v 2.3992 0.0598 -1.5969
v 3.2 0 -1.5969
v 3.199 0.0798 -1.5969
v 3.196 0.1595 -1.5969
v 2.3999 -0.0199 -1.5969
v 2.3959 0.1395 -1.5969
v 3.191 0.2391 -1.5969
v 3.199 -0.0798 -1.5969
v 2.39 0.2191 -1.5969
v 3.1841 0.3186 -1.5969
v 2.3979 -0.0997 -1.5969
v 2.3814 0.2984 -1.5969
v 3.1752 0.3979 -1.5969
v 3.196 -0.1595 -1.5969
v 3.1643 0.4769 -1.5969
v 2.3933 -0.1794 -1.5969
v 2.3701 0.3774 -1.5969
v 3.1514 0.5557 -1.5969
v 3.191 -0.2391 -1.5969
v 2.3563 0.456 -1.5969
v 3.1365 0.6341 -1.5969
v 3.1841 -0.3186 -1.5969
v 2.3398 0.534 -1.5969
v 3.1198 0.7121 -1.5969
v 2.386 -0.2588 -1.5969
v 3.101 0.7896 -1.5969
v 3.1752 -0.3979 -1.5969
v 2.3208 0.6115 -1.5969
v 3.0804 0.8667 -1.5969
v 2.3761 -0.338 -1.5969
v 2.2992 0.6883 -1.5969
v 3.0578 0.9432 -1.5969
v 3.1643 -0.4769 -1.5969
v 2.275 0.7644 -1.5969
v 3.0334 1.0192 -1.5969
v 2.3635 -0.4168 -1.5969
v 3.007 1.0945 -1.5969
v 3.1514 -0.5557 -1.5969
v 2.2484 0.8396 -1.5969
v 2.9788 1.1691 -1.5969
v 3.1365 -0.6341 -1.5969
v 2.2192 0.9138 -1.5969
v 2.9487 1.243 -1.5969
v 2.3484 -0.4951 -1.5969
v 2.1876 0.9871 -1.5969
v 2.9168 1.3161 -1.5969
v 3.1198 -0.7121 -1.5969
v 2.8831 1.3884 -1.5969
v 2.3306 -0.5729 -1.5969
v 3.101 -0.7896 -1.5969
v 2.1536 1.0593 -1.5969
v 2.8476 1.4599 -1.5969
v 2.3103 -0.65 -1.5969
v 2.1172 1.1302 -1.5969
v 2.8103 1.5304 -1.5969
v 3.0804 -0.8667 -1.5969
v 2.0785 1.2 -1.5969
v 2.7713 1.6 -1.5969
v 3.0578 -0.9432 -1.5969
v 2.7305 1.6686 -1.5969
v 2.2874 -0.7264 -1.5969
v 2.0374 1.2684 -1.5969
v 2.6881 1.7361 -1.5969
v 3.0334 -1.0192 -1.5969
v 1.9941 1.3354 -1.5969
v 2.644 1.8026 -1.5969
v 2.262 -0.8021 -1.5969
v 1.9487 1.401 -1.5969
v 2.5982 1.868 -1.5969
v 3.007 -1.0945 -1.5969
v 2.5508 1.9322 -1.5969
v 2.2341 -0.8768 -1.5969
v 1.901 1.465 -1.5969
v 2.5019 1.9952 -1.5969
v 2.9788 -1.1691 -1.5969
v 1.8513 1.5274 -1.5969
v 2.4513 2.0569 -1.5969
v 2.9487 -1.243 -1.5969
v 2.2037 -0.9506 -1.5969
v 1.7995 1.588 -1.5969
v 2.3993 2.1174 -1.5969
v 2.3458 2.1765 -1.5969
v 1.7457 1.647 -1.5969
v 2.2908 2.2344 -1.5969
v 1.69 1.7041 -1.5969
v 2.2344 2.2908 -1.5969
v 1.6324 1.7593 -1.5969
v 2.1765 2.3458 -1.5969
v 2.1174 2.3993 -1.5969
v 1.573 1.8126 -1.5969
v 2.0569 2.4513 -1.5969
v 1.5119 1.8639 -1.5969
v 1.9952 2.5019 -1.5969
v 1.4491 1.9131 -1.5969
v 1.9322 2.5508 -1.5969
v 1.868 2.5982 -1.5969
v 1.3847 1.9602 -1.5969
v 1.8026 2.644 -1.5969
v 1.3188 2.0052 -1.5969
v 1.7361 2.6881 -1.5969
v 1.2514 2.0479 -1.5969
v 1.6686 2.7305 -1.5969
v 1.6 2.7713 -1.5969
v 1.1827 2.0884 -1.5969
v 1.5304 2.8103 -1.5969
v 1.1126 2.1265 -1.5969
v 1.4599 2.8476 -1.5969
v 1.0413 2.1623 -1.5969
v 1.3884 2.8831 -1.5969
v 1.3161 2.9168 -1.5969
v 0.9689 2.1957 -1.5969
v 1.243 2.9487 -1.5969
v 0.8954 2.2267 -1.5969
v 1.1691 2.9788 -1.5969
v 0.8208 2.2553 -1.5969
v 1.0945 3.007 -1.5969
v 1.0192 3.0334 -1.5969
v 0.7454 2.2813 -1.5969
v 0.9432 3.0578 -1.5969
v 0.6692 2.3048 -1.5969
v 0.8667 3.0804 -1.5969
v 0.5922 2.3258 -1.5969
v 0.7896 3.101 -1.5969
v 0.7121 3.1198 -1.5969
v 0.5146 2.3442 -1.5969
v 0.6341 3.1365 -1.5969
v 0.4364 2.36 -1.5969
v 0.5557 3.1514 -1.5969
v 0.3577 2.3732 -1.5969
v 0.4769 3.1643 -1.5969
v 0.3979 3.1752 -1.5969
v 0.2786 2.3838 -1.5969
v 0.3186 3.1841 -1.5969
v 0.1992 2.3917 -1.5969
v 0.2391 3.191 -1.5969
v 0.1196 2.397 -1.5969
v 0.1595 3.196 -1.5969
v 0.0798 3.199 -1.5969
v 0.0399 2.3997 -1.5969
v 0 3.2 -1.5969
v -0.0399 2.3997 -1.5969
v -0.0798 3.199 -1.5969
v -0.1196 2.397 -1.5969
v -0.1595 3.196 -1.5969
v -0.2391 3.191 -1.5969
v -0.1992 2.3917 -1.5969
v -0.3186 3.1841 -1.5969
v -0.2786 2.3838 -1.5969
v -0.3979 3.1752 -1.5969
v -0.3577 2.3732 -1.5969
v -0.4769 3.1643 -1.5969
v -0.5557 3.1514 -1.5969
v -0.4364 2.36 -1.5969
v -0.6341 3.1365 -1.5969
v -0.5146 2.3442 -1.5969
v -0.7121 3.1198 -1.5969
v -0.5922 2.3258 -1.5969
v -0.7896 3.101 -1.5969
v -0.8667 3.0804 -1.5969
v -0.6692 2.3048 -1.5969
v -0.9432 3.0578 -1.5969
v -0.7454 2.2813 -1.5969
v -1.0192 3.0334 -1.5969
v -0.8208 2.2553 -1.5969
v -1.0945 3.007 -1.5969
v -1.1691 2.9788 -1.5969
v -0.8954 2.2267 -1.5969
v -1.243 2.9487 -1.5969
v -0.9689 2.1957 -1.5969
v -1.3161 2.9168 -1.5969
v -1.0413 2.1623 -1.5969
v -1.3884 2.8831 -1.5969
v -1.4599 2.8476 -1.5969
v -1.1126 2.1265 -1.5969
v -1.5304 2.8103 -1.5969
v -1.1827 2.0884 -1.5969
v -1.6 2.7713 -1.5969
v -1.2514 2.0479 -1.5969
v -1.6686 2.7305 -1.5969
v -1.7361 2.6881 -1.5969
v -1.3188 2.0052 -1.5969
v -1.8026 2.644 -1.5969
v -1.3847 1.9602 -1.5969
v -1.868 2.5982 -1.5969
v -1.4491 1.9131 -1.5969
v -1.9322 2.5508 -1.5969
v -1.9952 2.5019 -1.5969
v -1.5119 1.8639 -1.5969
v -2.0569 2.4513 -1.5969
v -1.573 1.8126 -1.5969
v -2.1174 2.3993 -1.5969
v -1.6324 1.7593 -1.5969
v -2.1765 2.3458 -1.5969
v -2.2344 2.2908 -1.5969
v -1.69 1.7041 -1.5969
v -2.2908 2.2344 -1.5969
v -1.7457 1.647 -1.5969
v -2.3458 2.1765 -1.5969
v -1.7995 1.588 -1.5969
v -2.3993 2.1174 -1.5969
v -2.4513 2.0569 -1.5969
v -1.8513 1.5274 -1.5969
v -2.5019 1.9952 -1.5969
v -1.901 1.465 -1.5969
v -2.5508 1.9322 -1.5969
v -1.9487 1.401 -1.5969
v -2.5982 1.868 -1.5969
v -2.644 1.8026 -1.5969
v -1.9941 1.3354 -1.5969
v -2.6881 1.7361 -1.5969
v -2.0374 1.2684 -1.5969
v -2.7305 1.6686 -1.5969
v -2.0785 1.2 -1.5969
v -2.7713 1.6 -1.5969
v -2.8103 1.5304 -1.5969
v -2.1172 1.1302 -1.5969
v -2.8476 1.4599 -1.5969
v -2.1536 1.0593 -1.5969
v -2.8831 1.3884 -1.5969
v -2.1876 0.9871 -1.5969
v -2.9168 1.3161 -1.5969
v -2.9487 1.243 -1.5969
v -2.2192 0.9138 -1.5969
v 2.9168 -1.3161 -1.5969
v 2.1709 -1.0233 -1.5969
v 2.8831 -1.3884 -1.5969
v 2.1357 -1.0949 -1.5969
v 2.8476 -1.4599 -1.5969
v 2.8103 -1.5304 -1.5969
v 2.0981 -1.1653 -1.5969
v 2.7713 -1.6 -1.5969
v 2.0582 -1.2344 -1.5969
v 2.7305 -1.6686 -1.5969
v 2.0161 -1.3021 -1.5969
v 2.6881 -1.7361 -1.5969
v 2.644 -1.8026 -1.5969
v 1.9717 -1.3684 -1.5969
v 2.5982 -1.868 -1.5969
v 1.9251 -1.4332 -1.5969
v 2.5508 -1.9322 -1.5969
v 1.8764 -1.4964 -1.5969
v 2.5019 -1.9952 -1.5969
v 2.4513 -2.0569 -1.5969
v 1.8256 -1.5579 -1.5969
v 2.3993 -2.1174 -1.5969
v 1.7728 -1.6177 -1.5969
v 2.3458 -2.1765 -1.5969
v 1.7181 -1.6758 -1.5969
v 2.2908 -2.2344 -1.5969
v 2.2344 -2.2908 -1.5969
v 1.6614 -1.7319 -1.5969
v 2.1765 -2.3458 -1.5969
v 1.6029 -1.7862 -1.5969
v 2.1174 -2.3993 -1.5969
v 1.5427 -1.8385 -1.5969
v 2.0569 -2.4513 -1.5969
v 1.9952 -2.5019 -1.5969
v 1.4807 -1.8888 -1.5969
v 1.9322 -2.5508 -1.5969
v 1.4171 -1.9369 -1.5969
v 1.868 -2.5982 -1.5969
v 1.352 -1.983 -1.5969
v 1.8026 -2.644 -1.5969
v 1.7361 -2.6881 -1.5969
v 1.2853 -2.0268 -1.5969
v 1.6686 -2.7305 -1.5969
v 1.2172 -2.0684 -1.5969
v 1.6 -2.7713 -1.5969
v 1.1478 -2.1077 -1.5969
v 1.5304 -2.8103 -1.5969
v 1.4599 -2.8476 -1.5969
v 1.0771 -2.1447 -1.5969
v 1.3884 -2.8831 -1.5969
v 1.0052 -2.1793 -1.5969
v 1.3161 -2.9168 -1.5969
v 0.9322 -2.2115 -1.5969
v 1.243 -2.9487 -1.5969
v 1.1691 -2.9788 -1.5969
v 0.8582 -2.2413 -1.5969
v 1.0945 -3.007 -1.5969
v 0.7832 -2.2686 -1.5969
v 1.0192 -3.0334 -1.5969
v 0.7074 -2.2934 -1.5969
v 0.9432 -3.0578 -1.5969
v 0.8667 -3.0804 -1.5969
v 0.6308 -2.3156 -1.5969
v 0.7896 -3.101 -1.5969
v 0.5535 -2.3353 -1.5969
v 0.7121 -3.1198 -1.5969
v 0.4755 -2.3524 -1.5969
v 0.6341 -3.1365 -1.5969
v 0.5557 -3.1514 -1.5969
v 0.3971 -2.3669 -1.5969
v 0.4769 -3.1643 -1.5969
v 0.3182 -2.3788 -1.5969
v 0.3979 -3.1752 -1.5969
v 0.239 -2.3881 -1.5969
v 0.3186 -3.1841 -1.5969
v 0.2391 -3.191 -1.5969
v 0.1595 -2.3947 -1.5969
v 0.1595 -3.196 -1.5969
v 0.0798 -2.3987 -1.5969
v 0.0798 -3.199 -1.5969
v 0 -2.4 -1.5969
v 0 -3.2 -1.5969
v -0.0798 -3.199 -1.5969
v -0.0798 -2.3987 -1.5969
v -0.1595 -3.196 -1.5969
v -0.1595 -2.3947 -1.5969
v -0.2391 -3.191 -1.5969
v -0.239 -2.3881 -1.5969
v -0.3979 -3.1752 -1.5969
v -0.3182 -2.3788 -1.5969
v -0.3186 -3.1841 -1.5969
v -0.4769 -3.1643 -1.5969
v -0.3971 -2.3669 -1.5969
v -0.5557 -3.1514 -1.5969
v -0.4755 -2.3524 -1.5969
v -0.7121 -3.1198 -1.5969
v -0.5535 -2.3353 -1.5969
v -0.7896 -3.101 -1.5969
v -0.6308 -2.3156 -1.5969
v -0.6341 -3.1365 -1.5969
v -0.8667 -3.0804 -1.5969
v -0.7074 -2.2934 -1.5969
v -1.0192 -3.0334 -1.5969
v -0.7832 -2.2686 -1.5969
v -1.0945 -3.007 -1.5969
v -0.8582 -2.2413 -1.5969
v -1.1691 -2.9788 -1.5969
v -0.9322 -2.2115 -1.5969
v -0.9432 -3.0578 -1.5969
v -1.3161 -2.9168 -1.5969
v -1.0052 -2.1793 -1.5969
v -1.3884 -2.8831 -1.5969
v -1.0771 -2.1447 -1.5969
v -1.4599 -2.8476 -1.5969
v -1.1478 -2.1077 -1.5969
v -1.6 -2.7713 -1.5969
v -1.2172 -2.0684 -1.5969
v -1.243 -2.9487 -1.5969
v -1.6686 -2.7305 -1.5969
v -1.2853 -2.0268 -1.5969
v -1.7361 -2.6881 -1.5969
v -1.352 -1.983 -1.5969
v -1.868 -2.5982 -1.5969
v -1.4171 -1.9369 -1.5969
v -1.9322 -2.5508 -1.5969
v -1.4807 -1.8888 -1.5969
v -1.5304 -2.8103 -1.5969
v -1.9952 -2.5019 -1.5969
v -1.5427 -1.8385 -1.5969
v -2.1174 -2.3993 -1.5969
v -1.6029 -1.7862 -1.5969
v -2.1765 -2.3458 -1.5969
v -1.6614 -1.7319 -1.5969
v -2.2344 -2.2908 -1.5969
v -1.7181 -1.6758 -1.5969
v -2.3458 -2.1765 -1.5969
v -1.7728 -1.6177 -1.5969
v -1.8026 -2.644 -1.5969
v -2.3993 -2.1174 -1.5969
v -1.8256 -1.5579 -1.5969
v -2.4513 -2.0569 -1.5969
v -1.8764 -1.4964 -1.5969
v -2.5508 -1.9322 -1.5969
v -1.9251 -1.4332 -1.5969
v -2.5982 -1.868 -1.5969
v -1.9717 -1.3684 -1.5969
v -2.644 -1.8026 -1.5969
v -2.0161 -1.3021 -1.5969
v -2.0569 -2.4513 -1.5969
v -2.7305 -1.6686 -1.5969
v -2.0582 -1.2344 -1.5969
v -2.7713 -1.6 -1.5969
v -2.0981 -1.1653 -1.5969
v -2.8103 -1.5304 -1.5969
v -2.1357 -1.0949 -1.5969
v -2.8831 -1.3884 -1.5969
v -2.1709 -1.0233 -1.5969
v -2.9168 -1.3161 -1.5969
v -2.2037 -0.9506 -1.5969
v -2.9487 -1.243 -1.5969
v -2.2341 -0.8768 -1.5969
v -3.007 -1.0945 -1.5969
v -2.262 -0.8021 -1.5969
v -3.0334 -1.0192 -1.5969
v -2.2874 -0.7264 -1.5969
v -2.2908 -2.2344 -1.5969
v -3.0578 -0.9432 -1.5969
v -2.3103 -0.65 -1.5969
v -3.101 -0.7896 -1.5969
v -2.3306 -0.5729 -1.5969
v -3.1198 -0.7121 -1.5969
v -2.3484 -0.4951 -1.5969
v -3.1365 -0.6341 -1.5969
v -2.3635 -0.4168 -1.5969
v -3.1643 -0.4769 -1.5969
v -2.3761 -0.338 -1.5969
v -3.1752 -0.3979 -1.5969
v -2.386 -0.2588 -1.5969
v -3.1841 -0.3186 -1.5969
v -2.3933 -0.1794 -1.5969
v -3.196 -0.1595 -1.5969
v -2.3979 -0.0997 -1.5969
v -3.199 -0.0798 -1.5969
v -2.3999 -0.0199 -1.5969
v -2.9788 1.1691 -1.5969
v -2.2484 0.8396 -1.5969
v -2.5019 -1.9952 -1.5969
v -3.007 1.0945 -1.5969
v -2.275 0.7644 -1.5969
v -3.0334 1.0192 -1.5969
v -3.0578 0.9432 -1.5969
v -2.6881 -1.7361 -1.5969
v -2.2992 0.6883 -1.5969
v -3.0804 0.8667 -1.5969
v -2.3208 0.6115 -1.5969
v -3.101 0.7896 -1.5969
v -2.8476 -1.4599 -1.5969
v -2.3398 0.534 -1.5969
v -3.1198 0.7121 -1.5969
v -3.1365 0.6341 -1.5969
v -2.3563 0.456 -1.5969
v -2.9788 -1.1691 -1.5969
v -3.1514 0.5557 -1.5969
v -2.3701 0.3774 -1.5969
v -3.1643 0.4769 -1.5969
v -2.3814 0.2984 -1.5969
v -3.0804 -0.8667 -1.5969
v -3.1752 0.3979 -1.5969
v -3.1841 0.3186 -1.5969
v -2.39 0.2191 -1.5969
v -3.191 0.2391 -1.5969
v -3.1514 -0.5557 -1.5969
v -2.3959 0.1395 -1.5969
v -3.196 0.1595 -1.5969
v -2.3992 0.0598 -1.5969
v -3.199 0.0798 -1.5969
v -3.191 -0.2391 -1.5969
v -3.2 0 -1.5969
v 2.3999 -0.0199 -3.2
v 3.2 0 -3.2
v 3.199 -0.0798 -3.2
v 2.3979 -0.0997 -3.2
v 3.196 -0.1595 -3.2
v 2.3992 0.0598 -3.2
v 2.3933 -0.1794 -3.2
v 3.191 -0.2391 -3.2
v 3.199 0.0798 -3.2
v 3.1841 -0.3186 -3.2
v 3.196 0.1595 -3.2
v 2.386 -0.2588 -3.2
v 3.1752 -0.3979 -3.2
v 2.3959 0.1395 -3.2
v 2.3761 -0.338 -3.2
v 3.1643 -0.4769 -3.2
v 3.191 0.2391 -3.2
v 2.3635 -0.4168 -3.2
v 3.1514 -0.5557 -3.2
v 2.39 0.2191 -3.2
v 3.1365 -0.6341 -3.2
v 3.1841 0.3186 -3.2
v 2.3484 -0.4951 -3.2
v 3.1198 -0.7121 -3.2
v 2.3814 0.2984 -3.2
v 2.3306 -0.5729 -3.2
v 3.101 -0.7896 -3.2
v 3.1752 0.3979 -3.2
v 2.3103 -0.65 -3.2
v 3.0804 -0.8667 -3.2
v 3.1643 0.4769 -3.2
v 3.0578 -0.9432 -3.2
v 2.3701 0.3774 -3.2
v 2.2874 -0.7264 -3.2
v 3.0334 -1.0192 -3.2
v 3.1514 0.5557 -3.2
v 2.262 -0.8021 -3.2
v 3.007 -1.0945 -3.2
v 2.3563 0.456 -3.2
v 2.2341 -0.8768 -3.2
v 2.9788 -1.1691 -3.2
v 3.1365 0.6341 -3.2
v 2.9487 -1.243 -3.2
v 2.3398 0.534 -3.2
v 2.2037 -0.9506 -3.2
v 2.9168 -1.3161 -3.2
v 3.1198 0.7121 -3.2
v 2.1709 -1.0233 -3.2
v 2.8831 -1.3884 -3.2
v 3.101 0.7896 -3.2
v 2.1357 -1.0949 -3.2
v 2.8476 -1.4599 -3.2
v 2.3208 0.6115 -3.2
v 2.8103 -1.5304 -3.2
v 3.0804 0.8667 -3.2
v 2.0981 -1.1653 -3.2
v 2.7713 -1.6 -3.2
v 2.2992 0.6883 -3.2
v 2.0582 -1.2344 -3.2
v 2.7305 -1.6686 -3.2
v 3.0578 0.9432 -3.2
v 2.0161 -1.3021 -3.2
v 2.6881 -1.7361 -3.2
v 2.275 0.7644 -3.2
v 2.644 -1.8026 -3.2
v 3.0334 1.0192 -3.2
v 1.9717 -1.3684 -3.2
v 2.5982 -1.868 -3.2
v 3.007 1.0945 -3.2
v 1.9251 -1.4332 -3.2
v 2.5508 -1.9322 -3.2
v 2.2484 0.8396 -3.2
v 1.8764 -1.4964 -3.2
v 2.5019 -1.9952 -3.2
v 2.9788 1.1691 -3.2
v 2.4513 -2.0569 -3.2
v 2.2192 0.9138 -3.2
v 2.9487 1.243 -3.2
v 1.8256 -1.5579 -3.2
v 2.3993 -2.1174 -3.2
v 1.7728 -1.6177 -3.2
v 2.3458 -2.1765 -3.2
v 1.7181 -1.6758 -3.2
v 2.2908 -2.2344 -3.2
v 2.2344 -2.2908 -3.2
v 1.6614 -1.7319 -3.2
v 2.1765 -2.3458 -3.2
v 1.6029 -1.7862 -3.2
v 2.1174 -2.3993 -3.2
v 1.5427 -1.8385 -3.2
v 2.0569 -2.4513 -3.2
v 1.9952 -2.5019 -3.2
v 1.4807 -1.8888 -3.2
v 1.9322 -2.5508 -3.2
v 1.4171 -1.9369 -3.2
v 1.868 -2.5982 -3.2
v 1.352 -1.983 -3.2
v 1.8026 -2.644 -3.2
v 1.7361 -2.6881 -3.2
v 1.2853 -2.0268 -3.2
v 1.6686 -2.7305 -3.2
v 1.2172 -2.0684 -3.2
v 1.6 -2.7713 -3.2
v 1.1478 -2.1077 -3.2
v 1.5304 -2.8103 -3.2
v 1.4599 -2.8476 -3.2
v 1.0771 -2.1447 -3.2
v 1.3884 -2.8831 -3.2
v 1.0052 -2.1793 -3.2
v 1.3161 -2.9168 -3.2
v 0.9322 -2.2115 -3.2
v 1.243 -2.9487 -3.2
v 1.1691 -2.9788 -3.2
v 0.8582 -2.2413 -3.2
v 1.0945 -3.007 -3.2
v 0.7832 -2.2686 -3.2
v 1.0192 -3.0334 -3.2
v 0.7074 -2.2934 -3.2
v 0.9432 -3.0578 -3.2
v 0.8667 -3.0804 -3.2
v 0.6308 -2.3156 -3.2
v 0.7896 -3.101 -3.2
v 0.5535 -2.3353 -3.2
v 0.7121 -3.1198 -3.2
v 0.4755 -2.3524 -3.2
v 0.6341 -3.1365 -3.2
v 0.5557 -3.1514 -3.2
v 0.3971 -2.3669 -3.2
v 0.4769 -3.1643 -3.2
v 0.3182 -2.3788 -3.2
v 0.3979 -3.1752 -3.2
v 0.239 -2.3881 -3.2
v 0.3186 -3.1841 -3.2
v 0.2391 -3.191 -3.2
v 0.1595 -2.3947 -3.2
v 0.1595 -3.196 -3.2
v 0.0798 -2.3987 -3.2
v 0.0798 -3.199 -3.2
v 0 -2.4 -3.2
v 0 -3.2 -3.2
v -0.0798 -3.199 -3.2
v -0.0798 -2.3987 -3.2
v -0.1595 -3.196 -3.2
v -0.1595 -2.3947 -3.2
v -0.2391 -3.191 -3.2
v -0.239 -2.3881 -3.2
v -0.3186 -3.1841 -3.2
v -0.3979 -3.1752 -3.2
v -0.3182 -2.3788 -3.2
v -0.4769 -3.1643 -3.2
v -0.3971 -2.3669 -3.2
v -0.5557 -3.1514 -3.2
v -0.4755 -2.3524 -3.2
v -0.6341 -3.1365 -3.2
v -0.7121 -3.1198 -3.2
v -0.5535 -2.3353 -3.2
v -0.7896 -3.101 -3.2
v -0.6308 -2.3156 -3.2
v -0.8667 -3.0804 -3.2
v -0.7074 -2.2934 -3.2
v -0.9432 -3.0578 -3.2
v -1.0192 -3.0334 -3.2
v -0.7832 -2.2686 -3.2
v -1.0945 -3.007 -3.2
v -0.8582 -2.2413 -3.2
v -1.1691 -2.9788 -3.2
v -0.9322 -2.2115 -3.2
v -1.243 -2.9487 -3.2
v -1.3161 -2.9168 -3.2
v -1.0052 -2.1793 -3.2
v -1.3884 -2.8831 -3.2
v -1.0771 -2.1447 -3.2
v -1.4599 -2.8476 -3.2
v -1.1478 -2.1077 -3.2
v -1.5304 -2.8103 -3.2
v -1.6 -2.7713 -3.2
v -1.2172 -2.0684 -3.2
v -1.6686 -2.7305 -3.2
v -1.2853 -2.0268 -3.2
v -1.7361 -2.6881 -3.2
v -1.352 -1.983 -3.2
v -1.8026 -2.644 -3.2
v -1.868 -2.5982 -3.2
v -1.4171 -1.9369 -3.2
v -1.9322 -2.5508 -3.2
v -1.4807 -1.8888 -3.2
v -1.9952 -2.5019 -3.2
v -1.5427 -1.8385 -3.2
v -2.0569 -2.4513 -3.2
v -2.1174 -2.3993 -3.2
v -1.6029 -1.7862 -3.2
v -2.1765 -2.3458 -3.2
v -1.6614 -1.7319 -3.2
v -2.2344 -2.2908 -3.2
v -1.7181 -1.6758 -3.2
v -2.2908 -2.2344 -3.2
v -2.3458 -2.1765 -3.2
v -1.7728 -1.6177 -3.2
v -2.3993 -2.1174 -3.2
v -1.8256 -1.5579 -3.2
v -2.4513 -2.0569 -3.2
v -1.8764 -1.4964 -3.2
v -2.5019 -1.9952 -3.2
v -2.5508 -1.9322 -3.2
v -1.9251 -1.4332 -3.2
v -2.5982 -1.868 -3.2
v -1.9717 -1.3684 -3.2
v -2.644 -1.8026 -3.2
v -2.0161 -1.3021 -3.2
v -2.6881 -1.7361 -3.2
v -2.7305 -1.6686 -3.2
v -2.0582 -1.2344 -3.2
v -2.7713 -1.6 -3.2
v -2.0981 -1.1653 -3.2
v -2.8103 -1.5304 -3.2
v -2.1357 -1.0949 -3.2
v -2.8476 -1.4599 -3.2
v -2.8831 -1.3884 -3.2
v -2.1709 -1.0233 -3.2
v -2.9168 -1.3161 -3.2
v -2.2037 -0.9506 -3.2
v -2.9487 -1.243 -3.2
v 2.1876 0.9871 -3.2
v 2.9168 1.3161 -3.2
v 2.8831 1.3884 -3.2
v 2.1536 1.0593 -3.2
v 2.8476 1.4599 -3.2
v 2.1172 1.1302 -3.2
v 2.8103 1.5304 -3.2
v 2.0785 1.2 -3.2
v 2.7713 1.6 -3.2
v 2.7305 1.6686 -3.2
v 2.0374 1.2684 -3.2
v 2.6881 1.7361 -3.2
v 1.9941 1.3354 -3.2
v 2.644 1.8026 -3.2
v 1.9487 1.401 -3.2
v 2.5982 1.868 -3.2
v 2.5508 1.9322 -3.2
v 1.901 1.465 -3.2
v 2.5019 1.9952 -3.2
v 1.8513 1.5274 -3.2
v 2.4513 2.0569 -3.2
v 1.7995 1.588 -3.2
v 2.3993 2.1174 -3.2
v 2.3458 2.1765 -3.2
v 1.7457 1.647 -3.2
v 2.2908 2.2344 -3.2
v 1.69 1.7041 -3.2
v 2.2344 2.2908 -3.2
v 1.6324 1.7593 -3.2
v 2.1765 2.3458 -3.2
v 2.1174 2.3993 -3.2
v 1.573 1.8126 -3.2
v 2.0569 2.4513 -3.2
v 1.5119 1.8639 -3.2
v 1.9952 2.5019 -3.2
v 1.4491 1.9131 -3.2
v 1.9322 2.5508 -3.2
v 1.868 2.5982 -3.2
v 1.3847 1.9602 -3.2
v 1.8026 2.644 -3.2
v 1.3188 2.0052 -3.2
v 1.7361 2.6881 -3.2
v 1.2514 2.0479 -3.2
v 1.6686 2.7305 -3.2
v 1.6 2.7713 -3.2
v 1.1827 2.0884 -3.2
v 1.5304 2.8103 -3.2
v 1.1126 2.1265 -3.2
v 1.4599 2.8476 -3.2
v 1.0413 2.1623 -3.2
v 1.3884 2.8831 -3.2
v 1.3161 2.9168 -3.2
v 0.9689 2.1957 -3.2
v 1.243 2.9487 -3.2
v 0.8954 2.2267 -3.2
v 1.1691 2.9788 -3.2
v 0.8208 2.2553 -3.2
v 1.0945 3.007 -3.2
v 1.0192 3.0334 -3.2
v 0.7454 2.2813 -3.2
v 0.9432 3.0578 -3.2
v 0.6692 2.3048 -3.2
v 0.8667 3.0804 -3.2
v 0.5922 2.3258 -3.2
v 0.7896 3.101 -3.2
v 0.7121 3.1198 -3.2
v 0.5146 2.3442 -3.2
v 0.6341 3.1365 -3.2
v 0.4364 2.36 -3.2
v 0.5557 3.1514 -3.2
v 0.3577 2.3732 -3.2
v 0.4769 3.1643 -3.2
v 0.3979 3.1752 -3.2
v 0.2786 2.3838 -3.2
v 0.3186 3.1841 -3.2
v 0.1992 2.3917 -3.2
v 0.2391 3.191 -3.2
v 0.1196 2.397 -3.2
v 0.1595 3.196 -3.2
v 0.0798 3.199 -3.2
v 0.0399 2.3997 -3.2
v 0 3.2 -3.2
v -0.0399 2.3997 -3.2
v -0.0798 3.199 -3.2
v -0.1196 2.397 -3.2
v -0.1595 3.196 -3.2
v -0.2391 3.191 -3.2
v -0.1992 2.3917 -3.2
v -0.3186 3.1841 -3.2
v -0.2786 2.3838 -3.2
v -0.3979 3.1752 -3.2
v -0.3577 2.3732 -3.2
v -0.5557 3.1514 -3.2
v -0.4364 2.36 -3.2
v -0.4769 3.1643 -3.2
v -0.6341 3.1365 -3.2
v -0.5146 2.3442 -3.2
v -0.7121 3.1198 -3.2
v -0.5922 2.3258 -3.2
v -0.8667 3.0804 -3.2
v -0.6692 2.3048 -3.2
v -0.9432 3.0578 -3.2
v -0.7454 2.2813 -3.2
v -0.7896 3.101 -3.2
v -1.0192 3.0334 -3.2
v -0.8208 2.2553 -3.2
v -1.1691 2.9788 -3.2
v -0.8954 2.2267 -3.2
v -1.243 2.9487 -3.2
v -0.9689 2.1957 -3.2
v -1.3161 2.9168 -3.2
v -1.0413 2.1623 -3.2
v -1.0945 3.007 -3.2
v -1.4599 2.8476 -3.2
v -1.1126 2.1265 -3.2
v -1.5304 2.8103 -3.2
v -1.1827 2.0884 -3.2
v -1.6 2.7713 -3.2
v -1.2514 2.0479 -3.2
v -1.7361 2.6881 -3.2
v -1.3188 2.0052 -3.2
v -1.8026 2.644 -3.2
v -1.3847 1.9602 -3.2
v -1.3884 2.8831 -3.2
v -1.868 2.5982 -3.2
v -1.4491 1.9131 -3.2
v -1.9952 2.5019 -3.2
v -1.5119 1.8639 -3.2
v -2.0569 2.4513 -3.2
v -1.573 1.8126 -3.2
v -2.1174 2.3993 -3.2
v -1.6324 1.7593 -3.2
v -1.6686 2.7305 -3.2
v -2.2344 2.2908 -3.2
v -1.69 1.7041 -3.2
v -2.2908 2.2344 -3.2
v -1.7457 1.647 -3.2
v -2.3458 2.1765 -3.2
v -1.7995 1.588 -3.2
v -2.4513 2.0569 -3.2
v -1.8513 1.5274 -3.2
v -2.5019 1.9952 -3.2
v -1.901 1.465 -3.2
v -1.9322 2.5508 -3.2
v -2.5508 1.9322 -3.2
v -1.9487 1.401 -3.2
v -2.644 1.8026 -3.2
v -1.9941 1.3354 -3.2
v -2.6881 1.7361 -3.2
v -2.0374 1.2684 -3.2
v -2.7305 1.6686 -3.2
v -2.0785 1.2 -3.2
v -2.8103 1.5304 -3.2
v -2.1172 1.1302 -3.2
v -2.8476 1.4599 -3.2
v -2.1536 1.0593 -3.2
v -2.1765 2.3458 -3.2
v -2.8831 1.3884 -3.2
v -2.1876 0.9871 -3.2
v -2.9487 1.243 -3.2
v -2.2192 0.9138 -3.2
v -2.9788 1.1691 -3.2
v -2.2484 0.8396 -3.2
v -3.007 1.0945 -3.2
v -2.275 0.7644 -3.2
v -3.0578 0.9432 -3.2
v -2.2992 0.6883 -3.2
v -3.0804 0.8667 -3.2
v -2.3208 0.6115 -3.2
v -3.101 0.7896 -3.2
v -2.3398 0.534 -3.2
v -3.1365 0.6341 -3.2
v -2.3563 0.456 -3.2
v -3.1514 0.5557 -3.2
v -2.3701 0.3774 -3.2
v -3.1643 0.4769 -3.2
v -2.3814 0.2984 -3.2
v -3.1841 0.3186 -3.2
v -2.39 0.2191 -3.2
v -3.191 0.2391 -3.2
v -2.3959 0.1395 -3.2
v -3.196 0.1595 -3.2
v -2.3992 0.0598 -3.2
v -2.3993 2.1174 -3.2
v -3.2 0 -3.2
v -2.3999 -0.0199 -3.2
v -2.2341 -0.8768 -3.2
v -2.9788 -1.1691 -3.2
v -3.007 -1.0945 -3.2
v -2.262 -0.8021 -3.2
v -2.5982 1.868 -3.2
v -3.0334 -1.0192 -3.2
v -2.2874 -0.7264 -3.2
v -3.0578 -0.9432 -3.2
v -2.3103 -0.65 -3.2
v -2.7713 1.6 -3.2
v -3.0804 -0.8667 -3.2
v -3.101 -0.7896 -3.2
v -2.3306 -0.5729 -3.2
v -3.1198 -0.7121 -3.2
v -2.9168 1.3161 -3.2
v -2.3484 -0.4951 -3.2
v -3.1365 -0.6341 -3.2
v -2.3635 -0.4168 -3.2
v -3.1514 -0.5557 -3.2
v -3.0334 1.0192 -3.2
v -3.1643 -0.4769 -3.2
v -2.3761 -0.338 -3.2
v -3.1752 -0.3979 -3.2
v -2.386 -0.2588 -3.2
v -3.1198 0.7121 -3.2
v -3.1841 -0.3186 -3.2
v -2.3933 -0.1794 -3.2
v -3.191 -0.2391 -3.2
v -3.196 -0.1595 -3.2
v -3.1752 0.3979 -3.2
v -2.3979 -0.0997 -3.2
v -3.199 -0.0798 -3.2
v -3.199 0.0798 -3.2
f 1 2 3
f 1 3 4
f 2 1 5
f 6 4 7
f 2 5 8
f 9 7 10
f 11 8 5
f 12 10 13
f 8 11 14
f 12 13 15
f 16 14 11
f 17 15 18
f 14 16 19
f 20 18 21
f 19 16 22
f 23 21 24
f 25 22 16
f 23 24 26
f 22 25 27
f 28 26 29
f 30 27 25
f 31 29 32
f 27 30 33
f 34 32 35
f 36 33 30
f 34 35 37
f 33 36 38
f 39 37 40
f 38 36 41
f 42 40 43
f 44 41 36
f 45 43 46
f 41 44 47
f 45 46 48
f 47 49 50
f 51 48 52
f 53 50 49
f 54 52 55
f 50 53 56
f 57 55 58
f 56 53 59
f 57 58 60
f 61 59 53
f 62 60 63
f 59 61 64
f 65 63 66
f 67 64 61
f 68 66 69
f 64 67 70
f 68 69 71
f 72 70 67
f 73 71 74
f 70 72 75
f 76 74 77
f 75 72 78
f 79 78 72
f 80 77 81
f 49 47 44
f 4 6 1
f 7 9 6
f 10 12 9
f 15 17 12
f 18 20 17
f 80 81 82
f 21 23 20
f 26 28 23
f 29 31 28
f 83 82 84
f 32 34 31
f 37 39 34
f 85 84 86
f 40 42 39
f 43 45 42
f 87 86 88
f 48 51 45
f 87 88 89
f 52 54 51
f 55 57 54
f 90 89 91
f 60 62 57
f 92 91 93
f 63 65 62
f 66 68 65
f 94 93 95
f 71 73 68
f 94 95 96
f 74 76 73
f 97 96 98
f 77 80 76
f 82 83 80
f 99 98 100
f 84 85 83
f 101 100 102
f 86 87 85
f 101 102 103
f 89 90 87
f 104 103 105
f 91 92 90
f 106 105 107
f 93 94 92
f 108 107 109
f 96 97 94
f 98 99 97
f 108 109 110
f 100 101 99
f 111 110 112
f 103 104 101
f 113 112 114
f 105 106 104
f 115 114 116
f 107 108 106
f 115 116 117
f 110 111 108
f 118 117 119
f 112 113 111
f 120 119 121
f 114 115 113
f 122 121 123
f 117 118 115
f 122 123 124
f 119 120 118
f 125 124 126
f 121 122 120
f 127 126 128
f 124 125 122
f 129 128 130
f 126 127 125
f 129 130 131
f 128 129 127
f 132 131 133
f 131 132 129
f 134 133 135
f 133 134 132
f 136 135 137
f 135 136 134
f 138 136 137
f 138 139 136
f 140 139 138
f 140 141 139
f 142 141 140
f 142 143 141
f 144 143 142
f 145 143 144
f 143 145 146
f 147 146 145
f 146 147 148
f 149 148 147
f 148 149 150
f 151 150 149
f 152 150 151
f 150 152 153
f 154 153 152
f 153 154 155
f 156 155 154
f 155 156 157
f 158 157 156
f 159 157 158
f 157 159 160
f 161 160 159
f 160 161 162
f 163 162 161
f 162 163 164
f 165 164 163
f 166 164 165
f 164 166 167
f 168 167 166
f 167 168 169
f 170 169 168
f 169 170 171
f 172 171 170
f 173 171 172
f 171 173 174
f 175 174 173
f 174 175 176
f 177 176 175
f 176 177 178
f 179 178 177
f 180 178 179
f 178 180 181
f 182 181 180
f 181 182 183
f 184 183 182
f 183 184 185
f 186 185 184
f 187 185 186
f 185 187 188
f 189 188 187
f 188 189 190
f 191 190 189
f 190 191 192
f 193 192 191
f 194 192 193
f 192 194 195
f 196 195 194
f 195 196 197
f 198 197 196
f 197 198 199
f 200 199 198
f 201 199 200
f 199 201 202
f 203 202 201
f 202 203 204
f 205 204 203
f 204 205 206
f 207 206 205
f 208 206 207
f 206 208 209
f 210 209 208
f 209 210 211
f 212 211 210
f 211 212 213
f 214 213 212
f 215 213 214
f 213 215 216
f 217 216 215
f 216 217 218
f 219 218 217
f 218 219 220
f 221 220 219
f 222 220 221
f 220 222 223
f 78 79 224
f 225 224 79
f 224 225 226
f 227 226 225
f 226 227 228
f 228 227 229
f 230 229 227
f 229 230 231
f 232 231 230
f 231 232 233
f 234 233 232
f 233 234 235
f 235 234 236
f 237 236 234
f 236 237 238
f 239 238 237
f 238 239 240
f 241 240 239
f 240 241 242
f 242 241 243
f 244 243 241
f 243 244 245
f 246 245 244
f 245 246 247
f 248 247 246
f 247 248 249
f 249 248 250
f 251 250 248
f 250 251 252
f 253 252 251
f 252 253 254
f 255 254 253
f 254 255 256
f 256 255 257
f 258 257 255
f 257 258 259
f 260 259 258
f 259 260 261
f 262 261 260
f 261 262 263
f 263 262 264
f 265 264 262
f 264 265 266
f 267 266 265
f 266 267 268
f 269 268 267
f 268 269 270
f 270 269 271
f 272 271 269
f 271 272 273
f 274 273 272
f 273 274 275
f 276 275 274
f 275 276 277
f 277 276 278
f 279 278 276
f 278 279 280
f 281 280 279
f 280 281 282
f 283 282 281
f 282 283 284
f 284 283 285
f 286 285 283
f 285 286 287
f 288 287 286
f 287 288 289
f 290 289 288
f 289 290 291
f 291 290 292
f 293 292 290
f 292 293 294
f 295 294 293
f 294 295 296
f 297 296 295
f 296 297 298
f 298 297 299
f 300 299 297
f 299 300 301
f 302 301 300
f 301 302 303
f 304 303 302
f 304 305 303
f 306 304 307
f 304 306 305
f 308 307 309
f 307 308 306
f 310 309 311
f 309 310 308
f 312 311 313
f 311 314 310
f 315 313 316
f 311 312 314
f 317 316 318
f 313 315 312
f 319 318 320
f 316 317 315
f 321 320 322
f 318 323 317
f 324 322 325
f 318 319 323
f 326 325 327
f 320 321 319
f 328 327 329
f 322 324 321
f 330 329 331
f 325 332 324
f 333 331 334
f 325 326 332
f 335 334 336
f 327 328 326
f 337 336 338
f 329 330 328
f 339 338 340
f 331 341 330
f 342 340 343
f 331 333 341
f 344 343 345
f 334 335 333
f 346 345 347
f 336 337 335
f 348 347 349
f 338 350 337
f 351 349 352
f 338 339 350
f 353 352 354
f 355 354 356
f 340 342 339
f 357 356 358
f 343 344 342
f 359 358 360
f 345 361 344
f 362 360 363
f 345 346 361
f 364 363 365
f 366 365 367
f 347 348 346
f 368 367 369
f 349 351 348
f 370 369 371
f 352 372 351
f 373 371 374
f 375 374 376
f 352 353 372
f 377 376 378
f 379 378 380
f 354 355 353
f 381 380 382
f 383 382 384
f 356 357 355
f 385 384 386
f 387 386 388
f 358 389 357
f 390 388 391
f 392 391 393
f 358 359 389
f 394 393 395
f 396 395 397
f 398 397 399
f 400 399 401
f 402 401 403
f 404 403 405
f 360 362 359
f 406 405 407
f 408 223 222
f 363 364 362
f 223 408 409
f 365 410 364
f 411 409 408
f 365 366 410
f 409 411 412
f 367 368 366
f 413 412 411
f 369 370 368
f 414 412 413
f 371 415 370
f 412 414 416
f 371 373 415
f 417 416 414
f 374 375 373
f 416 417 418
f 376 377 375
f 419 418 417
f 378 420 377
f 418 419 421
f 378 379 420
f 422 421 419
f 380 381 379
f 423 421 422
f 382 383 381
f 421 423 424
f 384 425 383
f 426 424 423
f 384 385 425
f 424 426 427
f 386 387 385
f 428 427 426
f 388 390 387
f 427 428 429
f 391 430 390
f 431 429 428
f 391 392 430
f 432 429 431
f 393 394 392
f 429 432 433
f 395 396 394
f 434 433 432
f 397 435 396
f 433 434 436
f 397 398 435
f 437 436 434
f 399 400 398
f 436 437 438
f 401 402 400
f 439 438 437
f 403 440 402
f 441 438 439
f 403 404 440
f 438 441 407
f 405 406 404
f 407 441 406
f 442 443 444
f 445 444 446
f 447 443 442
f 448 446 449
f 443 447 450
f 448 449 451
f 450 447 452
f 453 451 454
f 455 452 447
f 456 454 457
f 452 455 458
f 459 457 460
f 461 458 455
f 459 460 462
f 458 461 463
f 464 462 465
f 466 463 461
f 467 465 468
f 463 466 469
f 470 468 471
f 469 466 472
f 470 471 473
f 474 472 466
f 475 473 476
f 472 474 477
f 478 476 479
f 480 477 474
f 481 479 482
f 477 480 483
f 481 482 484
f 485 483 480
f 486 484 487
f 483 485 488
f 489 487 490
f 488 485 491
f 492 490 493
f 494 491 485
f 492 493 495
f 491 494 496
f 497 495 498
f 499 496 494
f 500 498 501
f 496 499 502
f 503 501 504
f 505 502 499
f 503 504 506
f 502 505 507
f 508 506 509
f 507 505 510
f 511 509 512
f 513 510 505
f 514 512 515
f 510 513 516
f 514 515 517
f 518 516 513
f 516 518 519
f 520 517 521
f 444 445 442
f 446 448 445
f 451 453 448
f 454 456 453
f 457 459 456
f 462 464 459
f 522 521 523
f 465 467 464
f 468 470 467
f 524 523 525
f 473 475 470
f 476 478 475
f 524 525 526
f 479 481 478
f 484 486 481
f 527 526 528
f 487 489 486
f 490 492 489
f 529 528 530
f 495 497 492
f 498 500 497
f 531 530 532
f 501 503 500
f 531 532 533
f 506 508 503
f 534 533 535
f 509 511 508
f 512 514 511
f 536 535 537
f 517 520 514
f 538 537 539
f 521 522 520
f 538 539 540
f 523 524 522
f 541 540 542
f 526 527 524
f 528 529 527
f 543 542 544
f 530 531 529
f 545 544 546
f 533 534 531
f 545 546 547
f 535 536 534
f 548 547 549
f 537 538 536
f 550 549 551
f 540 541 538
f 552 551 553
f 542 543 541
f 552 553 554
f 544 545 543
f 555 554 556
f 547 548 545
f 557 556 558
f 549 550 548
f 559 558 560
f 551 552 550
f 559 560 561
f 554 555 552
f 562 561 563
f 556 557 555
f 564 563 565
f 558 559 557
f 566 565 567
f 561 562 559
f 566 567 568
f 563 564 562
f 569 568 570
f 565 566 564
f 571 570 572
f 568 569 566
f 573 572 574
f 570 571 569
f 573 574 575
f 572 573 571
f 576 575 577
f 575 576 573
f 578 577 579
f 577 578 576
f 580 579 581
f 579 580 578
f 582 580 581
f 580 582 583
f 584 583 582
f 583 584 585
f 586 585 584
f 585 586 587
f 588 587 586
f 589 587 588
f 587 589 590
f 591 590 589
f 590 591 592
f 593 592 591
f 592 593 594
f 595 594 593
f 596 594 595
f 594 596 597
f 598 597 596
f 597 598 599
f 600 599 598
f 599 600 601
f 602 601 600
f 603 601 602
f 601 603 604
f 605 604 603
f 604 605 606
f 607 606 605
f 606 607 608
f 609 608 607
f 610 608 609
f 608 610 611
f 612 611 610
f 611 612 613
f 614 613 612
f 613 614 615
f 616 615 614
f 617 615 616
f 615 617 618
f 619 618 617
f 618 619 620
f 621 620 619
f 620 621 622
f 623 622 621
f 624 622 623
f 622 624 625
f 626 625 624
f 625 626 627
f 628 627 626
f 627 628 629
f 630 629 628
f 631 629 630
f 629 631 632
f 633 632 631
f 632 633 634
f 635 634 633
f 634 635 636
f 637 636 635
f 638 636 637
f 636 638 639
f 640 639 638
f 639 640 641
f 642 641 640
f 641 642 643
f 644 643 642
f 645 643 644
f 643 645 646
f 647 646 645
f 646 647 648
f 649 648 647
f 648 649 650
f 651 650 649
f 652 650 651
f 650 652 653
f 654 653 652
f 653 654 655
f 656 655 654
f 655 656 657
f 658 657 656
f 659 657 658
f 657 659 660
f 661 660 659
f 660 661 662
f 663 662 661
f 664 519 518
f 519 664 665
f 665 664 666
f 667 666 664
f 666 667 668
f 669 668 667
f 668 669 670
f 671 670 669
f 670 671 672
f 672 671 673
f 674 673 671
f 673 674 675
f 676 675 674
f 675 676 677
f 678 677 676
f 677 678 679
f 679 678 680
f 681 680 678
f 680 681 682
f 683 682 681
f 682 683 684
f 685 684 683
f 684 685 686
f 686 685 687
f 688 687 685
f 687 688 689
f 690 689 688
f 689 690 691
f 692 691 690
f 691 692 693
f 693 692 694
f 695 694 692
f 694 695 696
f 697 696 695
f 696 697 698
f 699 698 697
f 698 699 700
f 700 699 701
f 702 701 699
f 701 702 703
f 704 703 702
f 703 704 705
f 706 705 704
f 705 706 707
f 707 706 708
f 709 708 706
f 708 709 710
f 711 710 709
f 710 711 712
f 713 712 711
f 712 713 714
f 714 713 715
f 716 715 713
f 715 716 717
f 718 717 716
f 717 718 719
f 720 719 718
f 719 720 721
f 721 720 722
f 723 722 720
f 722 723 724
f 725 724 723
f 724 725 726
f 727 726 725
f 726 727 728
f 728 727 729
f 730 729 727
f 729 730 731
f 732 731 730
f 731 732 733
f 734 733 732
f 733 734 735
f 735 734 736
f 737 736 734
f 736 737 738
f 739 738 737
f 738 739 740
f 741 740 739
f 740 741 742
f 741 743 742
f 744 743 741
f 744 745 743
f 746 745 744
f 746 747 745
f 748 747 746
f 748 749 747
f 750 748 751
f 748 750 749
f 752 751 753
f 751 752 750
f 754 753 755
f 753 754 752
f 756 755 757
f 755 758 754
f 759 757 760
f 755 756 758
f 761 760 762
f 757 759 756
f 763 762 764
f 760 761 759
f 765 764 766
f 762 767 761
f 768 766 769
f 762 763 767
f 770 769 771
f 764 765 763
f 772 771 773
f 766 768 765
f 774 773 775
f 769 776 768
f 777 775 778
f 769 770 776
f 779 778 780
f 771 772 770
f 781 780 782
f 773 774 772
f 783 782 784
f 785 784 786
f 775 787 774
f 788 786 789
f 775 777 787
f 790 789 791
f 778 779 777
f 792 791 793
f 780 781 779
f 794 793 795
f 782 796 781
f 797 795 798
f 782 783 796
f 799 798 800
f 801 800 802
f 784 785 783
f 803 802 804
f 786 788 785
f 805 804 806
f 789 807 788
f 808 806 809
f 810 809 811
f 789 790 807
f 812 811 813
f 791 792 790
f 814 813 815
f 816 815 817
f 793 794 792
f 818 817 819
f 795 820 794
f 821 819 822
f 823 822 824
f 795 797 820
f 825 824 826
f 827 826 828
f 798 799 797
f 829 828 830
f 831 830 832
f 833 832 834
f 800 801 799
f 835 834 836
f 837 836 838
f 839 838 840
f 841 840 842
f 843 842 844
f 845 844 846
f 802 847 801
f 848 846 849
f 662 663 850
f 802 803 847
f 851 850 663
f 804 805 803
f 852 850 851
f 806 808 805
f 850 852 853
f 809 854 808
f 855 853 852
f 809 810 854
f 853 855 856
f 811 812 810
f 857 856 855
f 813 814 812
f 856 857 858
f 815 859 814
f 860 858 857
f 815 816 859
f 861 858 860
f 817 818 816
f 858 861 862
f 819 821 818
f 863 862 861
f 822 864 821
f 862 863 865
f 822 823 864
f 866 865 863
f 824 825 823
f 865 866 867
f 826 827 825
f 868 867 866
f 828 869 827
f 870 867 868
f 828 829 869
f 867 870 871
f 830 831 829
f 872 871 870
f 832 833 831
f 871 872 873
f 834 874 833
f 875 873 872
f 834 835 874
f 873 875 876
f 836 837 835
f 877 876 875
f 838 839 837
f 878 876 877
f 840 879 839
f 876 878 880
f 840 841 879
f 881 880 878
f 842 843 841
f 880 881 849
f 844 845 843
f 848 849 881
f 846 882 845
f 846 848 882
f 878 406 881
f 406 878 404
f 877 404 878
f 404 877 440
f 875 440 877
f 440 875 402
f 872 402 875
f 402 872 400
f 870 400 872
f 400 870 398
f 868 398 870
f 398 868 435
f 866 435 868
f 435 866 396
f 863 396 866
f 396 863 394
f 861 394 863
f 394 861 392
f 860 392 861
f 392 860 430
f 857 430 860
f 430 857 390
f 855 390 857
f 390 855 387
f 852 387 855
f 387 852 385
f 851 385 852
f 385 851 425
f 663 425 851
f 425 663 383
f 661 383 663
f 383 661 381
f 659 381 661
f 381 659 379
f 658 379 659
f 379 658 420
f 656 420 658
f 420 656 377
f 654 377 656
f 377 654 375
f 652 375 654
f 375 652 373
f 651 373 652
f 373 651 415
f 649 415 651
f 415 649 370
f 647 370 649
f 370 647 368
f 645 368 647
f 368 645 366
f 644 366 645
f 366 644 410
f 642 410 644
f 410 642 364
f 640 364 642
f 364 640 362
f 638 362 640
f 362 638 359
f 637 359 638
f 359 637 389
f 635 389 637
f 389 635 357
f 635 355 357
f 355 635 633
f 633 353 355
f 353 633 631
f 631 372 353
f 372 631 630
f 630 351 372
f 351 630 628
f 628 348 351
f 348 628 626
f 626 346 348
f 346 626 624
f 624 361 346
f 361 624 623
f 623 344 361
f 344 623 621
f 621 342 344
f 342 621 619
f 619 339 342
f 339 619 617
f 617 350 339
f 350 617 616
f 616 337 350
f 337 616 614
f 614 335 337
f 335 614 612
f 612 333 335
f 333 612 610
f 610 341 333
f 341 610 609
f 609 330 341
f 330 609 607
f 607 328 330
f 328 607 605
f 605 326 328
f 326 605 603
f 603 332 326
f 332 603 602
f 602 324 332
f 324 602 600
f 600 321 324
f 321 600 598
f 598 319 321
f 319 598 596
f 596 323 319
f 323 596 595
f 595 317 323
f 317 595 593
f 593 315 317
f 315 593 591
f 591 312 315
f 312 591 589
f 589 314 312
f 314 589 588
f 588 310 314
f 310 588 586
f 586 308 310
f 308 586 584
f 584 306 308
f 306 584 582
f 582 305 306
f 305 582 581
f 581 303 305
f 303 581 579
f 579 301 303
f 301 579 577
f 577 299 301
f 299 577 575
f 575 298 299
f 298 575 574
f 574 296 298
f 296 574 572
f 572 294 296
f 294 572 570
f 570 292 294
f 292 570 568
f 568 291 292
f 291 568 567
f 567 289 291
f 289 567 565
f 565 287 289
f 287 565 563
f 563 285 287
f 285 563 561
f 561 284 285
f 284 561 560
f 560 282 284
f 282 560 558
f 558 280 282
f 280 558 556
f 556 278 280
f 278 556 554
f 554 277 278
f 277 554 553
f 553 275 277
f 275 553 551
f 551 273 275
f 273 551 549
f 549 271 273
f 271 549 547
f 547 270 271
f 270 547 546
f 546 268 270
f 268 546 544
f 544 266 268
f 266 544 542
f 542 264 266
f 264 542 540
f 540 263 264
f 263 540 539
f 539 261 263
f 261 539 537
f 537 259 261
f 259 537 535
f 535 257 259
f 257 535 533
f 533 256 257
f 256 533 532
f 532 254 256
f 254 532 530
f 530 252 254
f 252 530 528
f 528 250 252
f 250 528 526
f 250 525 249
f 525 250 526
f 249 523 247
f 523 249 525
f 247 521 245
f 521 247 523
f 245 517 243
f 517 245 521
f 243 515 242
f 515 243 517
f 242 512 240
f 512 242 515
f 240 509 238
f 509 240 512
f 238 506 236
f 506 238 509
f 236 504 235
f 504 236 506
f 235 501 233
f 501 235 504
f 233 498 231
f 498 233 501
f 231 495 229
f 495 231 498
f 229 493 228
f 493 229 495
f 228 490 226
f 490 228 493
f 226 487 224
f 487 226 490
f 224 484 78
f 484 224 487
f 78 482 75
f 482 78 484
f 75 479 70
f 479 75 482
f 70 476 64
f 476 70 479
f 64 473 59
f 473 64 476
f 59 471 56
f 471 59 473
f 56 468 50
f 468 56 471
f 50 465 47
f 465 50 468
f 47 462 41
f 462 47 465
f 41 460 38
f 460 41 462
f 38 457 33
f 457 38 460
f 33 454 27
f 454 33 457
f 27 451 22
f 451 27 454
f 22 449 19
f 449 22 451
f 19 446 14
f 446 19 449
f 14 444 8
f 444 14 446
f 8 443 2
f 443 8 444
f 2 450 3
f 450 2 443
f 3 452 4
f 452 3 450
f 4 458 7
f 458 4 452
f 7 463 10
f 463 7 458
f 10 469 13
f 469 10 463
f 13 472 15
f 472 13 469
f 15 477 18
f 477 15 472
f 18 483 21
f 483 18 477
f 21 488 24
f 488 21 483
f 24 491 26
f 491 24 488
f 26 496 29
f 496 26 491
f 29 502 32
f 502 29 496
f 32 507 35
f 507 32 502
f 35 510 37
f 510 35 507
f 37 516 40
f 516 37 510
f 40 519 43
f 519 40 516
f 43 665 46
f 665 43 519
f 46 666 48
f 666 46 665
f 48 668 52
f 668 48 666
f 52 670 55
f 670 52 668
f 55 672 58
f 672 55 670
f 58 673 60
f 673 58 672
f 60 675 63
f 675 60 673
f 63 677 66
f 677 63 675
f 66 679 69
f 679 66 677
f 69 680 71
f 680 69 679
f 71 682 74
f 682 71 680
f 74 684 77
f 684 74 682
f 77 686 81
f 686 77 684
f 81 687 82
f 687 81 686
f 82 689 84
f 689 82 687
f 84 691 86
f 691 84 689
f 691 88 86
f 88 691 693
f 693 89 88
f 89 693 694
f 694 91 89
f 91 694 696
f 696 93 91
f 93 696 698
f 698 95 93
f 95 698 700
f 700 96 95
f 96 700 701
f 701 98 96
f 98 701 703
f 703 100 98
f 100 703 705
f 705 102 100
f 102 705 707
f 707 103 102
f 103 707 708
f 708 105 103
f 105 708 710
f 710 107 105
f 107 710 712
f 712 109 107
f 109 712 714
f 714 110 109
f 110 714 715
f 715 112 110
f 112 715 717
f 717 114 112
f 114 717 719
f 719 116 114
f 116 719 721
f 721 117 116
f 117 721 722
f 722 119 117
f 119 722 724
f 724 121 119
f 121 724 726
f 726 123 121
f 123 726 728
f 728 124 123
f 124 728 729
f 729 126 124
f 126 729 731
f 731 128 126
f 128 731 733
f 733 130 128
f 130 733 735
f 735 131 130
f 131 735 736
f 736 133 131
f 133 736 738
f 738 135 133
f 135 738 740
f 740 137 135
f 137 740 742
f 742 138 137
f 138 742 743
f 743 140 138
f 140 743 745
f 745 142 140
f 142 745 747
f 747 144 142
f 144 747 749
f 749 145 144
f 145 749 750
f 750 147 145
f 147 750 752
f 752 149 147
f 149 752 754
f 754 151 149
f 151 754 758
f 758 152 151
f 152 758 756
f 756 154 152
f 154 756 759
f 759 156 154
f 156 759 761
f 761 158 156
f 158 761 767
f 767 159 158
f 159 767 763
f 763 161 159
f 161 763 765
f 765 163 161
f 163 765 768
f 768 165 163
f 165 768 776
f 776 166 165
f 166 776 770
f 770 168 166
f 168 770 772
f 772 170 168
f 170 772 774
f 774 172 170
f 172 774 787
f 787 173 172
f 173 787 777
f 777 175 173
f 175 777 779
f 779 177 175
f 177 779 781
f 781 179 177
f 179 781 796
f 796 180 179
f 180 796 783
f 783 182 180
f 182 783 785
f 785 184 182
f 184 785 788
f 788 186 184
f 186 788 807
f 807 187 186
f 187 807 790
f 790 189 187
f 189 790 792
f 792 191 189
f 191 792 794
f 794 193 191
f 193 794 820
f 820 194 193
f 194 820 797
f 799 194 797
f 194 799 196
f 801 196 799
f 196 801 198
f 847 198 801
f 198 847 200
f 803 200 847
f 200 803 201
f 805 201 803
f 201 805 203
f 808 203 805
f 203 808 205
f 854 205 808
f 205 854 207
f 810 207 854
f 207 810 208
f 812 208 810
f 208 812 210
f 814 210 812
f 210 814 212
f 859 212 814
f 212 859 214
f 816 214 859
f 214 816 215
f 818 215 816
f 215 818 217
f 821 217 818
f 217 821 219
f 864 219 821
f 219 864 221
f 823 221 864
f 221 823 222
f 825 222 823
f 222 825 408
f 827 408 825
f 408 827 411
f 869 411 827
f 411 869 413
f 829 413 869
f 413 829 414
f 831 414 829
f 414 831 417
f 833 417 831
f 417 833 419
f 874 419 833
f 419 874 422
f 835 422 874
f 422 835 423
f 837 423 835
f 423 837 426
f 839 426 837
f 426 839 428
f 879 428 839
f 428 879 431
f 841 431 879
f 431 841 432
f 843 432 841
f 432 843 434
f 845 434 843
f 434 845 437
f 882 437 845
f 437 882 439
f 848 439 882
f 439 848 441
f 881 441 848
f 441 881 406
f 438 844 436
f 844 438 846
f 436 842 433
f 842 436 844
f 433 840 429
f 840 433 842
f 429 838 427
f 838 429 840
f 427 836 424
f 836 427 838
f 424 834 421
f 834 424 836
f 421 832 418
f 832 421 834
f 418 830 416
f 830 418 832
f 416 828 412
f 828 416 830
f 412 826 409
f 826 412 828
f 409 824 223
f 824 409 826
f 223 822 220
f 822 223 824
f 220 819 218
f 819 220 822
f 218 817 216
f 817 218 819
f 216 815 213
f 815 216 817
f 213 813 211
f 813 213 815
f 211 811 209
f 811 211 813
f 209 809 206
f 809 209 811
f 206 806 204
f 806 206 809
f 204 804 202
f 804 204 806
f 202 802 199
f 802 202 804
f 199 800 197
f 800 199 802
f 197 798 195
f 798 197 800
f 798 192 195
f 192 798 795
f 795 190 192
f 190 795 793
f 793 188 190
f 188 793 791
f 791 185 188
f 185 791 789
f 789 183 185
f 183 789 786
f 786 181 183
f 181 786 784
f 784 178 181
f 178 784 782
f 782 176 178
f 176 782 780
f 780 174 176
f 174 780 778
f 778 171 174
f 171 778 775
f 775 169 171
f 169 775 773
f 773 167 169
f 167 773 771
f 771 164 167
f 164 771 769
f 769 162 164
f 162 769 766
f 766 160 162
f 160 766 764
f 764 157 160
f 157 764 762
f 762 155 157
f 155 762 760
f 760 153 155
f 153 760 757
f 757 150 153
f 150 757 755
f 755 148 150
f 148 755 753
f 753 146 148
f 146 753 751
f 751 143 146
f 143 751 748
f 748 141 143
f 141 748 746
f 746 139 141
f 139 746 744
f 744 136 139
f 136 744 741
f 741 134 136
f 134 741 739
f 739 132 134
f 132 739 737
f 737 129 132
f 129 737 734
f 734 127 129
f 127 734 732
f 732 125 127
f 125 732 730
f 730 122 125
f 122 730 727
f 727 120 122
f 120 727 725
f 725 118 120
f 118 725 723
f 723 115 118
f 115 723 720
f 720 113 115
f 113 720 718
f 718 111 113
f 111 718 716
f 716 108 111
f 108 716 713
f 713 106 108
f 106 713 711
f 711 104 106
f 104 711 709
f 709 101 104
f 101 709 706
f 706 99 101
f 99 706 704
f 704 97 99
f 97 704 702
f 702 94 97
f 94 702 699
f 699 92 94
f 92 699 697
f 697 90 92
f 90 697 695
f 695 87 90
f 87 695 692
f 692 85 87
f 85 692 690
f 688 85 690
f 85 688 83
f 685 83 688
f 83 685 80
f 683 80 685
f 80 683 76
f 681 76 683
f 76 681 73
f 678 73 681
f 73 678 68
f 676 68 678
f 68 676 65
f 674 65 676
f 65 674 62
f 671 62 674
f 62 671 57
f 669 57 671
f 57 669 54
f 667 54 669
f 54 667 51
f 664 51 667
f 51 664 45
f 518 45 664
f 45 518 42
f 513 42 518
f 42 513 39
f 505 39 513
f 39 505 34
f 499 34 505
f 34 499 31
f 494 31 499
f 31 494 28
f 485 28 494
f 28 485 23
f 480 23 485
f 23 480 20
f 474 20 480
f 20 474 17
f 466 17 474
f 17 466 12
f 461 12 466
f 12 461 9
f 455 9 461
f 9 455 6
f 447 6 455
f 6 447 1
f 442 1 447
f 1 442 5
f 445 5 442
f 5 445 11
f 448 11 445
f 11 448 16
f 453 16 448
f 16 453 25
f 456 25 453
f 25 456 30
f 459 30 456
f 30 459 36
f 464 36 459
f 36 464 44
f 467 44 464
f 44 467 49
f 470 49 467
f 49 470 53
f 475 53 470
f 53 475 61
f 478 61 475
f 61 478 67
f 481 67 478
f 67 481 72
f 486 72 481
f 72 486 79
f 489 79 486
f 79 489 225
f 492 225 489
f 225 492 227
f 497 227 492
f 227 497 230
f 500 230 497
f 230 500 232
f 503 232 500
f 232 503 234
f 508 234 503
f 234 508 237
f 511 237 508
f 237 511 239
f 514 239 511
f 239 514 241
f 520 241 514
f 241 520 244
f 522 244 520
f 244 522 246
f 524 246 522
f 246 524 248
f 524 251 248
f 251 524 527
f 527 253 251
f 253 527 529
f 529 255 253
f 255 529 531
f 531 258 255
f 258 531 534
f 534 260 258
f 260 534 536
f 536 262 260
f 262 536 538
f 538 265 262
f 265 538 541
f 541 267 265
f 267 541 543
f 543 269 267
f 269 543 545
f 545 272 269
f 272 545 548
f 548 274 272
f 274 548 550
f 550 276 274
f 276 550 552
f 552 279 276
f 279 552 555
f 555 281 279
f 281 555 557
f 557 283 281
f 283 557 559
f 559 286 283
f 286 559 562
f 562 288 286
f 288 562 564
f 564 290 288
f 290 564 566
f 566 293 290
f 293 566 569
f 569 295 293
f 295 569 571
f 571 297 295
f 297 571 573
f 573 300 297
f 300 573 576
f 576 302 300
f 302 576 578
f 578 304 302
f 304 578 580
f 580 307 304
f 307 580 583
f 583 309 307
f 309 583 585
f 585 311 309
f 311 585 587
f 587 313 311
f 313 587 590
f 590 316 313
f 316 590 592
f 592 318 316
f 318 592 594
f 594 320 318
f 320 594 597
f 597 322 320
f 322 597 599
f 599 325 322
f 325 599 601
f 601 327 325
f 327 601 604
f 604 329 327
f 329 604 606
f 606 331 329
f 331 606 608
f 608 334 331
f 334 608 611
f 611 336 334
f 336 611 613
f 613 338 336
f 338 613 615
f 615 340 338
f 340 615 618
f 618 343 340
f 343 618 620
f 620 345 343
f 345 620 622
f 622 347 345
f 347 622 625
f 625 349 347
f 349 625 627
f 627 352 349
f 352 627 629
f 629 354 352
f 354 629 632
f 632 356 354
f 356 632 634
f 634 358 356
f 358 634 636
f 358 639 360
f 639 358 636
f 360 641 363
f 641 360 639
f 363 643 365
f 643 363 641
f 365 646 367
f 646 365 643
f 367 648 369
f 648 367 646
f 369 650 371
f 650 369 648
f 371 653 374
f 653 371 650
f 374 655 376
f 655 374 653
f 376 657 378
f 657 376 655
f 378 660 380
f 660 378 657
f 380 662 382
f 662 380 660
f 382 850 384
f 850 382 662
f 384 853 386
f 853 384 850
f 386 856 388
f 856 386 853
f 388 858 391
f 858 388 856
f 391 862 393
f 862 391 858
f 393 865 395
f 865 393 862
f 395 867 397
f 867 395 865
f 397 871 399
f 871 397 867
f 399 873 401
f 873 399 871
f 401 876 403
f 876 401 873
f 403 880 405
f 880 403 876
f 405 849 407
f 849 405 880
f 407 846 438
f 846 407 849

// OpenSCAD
use <../lib.scad>
use <s/3068bs01.scad>
use <s/3068p11a.scad>
use <s/3068p11s01.scad>
$fa=1; $fs=0.2;
function ldraw_lib__3068bp11(realsolid=false) = [
// 0 Tile  2 x  2 with Launch Command Logo Pattern
// 0 Name: 3068bp11.dat
// 0 Author: Miklos Hosszu [hmick]
// 0 !LDRAW_ORG Part UPDATE 2022-04
// 0 !LICENSE Licensed under CC BY 2.0 and CC BY 4.0 : see CAreadme.txt
// 
// 0 BFC CERTIFY CCW
  [0,"BFC","CERTIFY"],
  [0,"BFC","CCW"],
// 
// 0 !KEYWORDS Bricklink 3068px31, Set 6544, Space Shuttle, Spaceport, town
// 
// 0 !HISTORY 2004-11-06 [PTadmin] Official Update 2004-04
// 0 !HISTORY 2007-06-13 [PTadmin] Header formatted for Contributor Agreement
// 0 !HISTORY 2008-07-01 [PTadmin] Official Update 2008-01
// 0 !HISTORY 2020-08-25 [MagFors] Using background subfile
// 0 !HISTORY 2022-07-18 [PTadmin] Official Update 2022-04
// 
// 
// 1 16 0.649 0 -0.375 0.866025 0 0.5 0 1 0 -0.5 0 0.866025 s\3068p11a.dat
  [1,16,0.649,0,-0.375,0.866025,0,0.5,0,1,0,-0.5,0,0.866025, ldraw_lib__s__3068p11a(realsolid)],
// 1 16 0 0 0 1 0 0 0 1 0 0 0 1 s\3068p11s01.dat
  [1,16,0,0,0,1,0,0,0,1,0,0,0,1, ldraw_lib__s__3068p11s01(realsolid)],
// 1 16 0 0 0 1 0 0 0 1 0 0 0 1 s\3068bs01.dat
  [1,16,0,0,0,1,0,0,0,1,0,0,0,1, ldraw_lib__s__3068bs01(realsolid)],
];
module ldraw_lib__3068bp11(step=0, col=false, unit=2/5, alt=false, line=0.2, solid=!$preview)
    makepoly(ldraw_lib__3068bp11(solid), step=step, col=col, unit=unit, alt=alt, line=line, solid=solid);
ldraw_lib__3068bp11(line=0.2);
